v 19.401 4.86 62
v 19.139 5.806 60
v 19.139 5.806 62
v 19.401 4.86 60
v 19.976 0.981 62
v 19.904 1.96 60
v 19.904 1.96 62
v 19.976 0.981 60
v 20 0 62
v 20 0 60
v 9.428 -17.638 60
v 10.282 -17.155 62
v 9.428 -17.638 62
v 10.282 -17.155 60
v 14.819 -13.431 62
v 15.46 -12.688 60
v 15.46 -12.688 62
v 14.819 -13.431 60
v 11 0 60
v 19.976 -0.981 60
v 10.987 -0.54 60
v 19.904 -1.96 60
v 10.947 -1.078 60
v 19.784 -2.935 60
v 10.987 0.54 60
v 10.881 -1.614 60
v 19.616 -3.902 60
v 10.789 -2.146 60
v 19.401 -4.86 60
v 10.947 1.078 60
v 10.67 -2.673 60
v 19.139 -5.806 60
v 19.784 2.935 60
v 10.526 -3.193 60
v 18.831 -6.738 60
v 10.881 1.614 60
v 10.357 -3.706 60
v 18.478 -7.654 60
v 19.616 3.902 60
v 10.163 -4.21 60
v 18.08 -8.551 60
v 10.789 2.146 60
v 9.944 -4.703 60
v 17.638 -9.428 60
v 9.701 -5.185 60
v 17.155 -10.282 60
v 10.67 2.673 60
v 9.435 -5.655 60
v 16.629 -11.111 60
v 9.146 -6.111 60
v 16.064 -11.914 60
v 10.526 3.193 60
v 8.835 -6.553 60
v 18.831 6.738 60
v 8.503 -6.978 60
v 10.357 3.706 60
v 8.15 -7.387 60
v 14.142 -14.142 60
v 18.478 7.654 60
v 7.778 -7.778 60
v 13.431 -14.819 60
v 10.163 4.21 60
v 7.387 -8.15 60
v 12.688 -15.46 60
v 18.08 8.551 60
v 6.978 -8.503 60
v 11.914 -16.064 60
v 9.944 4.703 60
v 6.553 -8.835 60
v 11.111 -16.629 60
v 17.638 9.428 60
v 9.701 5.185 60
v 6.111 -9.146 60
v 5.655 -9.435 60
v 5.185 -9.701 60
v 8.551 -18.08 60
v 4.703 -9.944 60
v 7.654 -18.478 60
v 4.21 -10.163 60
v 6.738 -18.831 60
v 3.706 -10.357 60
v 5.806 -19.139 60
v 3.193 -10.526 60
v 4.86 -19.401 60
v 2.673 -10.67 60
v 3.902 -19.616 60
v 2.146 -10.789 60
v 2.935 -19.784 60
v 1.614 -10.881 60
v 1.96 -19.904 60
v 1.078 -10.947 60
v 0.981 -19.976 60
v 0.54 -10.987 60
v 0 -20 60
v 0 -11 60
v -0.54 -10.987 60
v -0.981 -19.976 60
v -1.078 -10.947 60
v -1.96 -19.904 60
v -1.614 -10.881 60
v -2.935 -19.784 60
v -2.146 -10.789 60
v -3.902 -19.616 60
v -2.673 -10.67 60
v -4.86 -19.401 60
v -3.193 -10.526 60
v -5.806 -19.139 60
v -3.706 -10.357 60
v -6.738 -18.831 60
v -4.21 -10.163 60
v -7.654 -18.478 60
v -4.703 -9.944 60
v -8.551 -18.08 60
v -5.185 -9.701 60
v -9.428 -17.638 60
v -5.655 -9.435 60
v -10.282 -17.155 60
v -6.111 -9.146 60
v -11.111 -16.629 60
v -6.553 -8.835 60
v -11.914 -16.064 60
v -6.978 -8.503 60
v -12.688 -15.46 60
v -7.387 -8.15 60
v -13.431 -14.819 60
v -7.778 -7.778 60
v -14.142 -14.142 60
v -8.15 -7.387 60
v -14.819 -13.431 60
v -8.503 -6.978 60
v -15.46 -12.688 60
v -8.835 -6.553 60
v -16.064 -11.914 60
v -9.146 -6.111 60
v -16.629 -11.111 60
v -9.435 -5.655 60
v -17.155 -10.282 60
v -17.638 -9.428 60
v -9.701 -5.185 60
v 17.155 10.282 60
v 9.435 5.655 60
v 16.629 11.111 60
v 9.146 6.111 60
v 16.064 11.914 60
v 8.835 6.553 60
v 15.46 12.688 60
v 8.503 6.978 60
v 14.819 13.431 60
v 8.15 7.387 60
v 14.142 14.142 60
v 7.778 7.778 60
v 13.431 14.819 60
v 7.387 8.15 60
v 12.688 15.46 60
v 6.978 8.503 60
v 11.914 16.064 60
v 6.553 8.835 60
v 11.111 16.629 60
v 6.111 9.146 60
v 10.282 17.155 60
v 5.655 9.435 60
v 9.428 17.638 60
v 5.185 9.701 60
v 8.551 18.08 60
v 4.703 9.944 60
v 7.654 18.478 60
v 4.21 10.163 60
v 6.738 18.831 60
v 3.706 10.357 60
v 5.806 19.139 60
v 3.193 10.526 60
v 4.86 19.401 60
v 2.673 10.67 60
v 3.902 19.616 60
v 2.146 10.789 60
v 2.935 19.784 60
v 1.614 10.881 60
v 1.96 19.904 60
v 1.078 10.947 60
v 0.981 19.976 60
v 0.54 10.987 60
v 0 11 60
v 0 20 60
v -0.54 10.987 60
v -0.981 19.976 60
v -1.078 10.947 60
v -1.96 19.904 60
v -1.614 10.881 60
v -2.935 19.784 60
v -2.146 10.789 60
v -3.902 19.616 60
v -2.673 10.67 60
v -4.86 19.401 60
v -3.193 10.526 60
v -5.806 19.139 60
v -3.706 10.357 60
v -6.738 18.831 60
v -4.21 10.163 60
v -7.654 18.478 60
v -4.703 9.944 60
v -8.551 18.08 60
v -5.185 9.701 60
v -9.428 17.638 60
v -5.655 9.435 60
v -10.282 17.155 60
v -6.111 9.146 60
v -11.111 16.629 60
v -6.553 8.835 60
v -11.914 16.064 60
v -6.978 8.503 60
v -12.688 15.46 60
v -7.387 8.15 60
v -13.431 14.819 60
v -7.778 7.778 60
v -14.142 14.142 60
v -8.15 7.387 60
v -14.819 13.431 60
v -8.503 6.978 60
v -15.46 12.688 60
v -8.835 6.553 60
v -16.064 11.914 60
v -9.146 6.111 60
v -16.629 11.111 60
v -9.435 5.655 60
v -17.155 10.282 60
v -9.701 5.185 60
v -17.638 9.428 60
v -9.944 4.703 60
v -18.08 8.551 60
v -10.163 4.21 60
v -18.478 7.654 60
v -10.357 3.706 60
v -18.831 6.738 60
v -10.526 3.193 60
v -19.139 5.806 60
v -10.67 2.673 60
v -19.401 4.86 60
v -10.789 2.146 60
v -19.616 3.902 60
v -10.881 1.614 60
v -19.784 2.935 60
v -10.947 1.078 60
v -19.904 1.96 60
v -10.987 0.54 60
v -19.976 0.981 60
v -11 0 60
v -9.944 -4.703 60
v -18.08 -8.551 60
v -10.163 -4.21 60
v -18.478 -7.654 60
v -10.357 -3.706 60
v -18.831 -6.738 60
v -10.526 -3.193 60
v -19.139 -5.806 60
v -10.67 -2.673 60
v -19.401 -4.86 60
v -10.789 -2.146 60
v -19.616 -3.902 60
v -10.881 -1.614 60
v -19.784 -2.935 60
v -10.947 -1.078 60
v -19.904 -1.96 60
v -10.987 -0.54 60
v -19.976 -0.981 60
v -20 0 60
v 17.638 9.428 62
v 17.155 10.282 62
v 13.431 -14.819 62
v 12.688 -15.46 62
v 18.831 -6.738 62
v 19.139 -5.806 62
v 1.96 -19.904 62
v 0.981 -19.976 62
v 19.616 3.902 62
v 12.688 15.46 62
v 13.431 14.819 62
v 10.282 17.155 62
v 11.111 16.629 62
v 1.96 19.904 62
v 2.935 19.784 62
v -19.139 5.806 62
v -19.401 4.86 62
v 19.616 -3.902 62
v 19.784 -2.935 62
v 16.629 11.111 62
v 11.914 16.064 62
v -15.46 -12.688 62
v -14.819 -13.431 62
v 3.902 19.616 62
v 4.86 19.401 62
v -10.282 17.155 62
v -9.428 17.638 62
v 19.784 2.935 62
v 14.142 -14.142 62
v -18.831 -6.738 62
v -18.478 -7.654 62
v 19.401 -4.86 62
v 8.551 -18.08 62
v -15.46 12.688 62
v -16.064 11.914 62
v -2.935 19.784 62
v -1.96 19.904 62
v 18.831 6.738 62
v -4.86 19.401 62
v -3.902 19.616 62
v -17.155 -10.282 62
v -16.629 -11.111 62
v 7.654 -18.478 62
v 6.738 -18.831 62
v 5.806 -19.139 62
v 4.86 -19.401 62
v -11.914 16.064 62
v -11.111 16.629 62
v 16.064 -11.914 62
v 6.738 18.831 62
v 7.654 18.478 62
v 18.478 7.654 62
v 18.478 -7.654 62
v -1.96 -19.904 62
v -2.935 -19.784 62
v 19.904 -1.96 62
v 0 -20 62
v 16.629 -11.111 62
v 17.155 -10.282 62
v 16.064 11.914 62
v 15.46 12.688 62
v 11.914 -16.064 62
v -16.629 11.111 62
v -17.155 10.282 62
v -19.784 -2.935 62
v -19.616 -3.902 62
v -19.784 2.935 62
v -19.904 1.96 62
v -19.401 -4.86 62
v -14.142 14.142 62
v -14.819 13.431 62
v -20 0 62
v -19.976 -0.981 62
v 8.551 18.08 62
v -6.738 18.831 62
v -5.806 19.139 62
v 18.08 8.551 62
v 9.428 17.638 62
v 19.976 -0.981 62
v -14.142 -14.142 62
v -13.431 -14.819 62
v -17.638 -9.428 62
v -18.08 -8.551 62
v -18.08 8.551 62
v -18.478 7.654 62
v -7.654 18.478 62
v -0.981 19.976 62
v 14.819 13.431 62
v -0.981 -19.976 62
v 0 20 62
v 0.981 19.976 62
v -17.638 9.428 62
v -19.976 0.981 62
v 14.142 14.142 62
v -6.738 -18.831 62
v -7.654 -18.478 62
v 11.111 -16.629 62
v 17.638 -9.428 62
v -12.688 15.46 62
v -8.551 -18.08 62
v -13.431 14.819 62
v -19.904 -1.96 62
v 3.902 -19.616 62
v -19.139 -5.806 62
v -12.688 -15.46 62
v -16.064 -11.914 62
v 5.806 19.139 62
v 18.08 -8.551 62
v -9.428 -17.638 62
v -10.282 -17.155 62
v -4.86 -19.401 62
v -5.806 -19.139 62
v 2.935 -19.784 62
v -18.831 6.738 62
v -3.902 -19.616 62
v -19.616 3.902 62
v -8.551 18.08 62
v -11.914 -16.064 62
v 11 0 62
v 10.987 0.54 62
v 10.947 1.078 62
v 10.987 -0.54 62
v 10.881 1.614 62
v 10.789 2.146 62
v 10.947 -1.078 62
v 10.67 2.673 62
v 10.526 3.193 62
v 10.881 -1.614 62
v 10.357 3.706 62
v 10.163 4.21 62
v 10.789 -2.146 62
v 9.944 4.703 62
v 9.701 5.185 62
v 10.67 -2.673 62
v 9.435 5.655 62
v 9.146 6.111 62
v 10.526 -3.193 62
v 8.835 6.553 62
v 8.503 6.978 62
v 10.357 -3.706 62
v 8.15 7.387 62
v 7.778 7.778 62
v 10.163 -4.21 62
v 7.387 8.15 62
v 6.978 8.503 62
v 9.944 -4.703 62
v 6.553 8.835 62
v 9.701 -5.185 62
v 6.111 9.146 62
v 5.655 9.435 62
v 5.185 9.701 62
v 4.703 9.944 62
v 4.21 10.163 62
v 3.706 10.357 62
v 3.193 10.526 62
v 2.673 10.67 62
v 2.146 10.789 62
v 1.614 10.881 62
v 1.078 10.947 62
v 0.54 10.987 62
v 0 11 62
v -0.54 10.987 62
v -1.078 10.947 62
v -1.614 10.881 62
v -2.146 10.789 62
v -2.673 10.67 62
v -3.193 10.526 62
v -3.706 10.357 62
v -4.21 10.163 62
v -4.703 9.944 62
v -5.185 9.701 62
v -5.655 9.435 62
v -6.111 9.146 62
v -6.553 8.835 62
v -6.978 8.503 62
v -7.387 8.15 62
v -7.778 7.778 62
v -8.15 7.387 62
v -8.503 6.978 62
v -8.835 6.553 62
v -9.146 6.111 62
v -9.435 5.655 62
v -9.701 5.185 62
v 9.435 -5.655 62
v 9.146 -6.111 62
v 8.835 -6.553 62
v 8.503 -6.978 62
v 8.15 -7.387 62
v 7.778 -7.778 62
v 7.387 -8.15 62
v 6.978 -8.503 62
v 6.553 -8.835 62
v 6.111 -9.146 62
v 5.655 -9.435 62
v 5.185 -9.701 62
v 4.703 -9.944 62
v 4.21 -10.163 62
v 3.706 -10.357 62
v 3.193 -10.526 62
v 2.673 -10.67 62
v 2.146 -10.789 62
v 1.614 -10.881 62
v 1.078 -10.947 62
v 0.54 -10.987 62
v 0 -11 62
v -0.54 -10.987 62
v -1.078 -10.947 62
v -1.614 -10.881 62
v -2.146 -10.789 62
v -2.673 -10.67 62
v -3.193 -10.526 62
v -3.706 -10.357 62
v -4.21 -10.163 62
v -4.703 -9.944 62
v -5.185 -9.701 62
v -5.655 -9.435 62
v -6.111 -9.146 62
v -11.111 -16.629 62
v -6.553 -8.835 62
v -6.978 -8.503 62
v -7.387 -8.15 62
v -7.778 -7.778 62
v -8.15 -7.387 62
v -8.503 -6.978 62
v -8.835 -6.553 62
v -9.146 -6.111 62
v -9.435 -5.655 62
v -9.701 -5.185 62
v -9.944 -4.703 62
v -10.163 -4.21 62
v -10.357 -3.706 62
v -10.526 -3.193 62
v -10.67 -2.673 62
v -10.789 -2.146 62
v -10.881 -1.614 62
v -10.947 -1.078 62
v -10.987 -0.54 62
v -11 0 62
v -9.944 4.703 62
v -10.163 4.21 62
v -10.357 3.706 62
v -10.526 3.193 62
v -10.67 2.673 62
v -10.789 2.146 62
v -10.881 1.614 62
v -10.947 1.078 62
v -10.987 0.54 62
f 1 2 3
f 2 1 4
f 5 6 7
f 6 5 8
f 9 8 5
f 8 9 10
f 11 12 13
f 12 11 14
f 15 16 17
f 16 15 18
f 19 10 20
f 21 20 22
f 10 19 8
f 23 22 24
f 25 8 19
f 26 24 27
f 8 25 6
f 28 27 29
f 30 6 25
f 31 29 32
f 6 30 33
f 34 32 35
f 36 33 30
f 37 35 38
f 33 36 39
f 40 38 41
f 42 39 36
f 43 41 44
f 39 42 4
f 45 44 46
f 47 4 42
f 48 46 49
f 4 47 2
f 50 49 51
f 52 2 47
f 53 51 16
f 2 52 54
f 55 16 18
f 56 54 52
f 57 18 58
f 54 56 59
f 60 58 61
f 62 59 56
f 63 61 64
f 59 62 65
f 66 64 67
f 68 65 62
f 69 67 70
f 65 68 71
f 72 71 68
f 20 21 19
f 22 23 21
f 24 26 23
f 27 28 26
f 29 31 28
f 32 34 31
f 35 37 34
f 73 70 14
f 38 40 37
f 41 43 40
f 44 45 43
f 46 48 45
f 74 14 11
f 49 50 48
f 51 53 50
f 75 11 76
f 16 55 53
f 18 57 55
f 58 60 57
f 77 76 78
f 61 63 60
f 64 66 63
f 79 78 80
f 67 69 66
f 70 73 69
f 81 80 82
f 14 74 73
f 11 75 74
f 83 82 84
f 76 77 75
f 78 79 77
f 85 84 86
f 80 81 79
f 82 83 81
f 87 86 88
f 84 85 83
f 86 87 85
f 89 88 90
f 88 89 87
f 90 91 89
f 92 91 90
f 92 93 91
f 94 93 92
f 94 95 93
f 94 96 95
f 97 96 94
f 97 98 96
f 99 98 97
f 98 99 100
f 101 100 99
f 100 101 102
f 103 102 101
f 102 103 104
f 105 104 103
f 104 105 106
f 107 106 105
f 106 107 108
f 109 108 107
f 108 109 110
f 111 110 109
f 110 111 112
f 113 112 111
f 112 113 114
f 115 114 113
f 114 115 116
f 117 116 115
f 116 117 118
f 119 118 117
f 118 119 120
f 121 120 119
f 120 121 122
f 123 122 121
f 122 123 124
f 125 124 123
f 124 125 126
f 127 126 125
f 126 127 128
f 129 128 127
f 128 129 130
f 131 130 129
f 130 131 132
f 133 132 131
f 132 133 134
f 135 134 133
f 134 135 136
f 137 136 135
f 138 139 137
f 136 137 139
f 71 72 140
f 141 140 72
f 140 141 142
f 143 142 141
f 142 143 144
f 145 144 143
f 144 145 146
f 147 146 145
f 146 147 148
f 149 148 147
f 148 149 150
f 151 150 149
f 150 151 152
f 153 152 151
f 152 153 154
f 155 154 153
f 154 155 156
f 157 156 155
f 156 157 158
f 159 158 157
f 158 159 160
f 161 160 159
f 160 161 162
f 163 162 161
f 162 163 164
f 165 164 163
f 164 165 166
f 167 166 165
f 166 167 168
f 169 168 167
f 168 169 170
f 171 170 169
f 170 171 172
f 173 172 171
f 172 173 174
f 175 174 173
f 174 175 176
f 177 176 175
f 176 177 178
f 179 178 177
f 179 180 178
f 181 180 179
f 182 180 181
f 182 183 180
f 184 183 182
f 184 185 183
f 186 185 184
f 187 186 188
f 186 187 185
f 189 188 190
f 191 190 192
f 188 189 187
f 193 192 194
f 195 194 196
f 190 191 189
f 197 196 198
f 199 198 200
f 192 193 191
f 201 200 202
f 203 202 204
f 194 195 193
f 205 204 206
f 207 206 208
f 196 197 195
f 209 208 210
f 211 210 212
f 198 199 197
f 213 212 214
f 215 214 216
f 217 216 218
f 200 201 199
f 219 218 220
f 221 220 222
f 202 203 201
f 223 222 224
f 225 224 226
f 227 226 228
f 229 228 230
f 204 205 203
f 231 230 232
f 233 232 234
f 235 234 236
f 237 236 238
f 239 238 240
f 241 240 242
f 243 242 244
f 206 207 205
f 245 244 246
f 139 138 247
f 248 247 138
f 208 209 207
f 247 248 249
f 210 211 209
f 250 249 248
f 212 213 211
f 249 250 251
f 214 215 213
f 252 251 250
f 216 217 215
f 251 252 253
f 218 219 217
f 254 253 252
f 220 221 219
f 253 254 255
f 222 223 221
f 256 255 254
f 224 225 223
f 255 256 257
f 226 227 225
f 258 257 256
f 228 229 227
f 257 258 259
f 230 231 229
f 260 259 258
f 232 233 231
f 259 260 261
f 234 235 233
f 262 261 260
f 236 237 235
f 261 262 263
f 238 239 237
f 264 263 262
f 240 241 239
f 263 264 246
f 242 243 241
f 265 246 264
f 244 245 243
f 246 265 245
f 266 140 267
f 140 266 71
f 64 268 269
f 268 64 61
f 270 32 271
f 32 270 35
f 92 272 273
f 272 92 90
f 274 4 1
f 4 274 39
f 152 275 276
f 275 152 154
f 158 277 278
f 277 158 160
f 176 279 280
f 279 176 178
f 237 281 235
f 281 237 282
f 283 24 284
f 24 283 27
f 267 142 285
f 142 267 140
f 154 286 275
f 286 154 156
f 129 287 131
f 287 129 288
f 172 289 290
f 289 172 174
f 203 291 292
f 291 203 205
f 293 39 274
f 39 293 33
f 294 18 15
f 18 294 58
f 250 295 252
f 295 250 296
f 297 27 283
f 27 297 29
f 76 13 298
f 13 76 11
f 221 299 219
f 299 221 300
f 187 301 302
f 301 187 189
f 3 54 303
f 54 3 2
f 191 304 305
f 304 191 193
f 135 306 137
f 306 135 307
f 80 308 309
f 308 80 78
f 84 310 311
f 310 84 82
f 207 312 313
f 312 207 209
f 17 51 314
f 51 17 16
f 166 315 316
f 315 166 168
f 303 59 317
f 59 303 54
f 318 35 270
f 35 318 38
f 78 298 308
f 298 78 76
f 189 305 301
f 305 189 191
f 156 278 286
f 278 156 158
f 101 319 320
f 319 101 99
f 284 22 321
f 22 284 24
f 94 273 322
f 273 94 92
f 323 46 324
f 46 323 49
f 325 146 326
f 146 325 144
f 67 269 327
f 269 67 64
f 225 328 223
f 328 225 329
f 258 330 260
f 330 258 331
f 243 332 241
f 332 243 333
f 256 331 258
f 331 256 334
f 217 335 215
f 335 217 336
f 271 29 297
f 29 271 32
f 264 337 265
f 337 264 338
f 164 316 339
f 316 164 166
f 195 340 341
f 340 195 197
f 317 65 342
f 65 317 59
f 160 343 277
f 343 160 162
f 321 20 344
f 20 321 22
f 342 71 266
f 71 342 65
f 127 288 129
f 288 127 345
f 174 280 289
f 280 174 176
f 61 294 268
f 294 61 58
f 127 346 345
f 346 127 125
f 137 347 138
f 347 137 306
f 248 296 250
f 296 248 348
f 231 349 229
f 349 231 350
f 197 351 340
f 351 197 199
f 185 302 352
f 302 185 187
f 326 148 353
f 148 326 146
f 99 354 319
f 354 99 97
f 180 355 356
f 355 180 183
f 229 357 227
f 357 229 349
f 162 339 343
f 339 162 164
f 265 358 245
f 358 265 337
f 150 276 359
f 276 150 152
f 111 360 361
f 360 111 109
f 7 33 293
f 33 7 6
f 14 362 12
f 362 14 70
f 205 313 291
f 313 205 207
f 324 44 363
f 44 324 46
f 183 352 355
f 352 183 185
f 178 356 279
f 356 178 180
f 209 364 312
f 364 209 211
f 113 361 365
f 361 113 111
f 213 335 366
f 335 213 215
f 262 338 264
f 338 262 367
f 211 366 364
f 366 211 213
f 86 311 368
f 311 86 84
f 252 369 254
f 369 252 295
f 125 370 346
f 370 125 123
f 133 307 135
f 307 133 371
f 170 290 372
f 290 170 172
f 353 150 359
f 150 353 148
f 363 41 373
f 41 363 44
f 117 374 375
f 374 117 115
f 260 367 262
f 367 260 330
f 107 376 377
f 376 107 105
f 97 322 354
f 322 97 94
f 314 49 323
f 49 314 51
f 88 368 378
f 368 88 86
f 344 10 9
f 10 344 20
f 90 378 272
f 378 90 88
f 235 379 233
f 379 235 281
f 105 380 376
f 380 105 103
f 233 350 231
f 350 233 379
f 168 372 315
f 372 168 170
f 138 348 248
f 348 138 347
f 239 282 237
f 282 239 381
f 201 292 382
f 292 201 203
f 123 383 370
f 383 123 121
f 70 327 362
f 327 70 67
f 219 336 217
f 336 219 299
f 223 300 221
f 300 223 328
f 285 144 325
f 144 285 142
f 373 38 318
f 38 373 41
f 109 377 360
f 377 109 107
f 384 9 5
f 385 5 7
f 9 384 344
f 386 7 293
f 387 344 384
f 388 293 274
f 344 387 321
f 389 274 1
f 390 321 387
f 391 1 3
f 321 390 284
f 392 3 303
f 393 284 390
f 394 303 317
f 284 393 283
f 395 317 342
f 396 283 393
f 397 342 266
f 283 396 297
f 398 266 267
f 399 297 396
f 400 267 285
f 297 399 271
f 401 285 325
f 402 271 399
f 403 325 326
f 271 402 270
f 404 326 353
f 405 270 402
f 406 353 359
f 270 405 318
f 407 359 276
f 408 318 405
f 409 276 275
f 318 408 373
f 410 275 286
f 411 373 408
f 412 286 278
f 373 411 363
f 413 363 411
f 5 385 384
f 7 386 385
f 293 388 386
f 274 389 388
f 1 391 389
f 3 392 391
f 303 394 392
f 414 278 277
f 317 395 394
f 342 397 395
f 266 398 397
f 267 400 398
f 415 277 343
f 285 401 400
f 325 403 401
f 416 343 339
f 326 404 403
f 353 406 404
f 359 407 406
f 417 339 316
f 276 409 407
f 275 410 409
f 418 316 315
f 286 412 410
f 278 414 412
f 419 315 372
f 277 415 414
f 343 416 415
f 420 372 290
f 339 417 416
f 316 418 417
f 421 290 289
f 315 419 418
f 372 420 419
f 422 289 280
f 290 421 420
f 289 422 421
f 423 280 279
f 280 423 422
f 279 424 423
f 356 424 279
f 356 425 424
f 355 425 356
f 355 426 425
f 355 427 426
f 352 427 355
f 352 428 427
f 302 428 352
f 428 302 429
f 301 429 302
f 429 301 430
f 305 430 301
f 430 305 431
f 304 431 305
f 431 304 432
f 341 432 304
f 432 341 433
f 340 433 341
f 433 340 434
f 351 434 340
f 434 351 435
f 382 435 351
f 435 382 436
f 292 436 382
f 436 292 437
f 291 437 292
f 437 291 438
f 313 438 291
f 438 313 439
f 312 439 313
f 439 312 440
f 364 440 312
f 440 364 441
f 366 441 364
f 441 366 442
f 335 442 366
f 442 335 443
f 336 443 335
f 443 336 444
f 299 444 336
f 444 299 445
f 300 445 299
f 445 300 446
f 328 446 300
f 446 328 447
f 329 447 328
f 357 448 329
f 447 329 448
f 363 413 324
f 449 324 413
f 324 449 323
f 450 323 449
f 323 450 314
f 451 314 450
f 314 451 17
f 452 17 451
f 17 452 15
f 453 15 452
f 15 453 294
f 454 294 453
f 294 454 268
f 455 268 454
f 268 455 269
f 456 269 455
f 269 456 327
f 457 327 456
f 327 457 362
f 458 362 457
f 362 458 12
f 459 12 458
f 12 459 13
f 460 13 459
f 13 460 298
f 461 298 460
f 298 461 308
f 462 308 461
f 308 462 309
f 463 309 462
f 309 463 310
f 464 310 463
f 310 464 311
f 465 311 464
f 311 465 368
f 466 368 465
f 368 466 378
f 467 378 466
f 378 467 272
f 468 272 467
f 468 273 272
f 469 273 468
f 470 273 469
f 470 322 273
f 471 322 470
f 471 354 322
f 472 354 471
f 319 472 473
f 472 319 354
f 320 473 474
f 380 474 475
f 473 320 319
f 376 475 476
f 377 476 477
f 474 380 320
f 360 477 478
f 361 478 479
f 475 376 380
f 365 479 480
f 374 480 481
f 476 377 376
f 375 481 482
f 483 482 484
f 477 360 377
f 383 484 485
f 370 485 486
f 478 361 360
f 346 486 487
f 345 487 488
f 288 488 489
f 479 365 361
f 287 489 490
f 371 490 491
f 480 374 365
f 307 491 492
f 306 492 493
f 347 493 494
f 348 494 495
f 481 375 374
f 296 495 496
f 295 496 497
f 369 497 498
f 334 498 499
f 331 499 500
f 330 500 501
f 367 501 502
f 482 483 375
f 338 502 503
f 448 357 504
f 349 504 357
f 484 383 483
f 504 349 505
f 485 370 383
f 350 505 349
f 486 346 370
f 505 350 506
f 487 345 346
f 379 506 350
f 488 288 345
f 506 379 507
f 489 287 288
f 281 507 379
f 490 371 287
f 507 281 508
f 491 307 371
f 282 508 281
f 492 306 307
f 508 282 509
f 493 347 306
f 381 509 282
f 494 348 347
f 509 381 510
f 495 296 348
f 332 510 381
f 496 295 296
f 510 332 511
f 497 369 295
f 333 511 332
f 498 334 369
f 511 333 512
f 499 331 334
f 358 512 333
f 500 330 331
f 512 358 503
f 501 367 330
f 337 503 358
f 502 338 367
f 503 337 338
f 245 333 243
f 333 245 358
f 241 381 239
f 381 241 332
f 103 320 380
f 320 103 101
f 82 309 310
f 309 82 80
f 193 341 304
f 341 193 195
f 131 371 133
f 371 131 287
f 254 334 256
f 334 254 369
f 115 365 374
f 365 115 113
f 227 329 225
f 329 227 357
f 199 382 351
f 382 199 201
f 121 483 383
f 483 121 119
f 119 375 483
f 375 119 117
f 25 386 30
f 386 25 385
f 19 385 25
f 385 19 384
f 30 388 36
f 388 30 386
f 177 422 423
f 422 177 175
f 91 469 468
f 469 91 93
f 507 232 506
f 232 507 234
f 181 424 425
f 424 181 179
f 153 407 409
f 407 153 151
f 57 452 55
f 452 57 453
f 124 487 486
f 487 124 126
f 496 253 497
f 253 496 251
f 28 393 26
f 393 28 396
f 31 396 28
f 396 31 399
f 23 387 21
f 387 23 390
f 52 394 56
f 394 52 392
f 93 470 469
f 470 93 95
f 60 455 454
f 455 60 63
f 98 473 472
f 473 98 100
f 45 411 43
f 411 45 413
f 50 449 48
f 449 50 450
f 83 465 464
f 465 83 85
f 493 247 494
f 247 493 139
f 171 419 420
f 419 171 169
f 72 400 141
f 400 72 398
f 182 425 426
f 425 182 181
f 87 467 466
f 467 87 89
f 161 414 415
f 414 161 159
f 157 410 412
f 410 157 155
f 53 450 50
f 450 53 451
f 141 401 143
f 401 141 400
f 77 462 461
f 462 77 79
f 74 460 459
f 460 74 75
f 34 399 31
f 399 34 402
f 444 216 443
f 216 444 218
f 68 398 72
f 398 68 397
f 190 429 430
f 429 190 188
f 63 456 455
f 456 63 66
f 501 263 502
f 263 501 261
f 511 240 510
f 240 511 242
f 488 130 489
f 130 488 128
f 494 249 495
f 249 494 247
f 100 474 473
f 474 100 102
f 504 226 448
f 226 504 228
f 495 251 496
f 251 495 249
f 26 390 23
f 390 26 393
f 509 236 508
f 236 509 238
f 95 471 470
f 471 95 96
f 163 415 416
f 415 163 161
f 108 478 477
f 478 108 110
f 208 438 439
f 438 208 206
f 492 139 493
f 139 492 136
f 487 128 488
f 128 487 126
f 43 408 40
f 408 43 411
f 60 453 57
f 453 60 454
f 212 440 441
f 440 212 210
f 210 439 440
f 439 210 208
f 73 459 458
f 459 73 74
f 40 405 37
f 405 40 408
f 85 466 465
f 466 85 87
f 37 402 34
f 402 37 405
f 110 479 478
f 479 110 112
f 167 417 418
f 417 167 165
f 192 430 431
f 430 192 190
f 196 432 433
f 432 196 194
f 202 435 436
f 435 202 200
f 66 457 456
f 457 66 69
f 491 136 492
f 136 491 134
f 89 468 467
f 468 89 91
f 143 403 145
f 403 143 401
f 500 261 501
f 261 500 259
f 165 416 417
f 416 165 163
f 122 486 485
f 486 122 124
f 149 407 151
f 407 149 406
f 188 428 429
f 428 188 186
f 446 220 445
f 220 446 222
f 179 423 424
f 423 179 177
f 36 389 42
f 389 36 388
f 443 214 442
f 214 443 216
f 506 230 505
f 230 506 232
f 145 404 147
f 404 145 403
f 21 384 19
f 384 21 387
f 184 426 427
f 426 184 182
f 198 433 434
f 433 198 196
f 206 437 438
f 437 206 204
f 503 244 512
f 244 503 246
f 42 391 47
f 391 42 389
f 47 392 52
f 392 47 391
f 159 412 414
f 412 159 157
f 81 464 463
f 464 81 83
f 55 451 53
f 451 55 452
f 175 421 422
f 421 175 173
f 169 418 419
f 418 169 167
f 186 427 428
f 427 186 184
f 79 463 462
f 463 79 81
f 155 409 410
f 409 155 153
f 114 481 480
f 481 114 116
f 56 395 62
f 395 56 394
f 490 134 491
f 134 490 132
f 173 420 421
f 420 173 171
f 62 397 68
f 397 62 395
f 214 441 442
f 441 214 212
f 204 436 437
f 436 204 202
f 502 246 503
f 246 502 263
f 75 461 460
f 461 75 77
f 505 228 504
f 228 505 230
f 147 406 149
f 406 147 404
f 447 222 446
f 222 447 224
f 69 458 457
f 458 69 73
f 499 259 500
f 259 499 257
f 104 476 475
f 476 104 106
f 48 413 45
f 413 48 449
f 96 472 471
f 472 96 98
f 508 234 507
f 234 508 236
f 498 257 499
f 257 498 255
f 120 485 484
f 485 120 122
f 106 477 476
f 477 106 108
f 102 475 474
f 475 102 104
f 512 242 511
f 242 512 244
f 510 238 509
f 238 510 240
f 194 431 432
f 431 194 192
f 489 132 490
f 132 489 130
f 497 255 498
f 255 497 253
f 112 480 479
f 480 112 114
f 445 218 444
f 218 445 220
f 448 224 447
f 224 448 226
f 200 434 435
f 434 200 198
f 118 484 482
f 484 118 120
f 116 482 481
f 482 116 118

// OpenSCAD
// file: common_params.scad
cylinder_radius = 20.000000;
cylinder_height = 60.000000;
wall_thickness = 2.000000;

cap_thickness = 2.000000;

rod_radius = 2.000000;
rod_height = 50.000000;

ring_outer_radius = 8.000000;
ring_inner_radius = 4.000000;
ring_thickness = 3.000000;
ring_z = 40.000000;

$fn = 128;
// main file
include <common_params.scad>;

hole_radius = 11.000000;

translate([0, 0, cylinder_height])
difference() {
    cylinder(h = cap_thickness, r = cylinder_radius);
    translate([0, 0, -0.1])
        cylinder(h = cap_thickness + 0.2, r = hole_radius);
}
